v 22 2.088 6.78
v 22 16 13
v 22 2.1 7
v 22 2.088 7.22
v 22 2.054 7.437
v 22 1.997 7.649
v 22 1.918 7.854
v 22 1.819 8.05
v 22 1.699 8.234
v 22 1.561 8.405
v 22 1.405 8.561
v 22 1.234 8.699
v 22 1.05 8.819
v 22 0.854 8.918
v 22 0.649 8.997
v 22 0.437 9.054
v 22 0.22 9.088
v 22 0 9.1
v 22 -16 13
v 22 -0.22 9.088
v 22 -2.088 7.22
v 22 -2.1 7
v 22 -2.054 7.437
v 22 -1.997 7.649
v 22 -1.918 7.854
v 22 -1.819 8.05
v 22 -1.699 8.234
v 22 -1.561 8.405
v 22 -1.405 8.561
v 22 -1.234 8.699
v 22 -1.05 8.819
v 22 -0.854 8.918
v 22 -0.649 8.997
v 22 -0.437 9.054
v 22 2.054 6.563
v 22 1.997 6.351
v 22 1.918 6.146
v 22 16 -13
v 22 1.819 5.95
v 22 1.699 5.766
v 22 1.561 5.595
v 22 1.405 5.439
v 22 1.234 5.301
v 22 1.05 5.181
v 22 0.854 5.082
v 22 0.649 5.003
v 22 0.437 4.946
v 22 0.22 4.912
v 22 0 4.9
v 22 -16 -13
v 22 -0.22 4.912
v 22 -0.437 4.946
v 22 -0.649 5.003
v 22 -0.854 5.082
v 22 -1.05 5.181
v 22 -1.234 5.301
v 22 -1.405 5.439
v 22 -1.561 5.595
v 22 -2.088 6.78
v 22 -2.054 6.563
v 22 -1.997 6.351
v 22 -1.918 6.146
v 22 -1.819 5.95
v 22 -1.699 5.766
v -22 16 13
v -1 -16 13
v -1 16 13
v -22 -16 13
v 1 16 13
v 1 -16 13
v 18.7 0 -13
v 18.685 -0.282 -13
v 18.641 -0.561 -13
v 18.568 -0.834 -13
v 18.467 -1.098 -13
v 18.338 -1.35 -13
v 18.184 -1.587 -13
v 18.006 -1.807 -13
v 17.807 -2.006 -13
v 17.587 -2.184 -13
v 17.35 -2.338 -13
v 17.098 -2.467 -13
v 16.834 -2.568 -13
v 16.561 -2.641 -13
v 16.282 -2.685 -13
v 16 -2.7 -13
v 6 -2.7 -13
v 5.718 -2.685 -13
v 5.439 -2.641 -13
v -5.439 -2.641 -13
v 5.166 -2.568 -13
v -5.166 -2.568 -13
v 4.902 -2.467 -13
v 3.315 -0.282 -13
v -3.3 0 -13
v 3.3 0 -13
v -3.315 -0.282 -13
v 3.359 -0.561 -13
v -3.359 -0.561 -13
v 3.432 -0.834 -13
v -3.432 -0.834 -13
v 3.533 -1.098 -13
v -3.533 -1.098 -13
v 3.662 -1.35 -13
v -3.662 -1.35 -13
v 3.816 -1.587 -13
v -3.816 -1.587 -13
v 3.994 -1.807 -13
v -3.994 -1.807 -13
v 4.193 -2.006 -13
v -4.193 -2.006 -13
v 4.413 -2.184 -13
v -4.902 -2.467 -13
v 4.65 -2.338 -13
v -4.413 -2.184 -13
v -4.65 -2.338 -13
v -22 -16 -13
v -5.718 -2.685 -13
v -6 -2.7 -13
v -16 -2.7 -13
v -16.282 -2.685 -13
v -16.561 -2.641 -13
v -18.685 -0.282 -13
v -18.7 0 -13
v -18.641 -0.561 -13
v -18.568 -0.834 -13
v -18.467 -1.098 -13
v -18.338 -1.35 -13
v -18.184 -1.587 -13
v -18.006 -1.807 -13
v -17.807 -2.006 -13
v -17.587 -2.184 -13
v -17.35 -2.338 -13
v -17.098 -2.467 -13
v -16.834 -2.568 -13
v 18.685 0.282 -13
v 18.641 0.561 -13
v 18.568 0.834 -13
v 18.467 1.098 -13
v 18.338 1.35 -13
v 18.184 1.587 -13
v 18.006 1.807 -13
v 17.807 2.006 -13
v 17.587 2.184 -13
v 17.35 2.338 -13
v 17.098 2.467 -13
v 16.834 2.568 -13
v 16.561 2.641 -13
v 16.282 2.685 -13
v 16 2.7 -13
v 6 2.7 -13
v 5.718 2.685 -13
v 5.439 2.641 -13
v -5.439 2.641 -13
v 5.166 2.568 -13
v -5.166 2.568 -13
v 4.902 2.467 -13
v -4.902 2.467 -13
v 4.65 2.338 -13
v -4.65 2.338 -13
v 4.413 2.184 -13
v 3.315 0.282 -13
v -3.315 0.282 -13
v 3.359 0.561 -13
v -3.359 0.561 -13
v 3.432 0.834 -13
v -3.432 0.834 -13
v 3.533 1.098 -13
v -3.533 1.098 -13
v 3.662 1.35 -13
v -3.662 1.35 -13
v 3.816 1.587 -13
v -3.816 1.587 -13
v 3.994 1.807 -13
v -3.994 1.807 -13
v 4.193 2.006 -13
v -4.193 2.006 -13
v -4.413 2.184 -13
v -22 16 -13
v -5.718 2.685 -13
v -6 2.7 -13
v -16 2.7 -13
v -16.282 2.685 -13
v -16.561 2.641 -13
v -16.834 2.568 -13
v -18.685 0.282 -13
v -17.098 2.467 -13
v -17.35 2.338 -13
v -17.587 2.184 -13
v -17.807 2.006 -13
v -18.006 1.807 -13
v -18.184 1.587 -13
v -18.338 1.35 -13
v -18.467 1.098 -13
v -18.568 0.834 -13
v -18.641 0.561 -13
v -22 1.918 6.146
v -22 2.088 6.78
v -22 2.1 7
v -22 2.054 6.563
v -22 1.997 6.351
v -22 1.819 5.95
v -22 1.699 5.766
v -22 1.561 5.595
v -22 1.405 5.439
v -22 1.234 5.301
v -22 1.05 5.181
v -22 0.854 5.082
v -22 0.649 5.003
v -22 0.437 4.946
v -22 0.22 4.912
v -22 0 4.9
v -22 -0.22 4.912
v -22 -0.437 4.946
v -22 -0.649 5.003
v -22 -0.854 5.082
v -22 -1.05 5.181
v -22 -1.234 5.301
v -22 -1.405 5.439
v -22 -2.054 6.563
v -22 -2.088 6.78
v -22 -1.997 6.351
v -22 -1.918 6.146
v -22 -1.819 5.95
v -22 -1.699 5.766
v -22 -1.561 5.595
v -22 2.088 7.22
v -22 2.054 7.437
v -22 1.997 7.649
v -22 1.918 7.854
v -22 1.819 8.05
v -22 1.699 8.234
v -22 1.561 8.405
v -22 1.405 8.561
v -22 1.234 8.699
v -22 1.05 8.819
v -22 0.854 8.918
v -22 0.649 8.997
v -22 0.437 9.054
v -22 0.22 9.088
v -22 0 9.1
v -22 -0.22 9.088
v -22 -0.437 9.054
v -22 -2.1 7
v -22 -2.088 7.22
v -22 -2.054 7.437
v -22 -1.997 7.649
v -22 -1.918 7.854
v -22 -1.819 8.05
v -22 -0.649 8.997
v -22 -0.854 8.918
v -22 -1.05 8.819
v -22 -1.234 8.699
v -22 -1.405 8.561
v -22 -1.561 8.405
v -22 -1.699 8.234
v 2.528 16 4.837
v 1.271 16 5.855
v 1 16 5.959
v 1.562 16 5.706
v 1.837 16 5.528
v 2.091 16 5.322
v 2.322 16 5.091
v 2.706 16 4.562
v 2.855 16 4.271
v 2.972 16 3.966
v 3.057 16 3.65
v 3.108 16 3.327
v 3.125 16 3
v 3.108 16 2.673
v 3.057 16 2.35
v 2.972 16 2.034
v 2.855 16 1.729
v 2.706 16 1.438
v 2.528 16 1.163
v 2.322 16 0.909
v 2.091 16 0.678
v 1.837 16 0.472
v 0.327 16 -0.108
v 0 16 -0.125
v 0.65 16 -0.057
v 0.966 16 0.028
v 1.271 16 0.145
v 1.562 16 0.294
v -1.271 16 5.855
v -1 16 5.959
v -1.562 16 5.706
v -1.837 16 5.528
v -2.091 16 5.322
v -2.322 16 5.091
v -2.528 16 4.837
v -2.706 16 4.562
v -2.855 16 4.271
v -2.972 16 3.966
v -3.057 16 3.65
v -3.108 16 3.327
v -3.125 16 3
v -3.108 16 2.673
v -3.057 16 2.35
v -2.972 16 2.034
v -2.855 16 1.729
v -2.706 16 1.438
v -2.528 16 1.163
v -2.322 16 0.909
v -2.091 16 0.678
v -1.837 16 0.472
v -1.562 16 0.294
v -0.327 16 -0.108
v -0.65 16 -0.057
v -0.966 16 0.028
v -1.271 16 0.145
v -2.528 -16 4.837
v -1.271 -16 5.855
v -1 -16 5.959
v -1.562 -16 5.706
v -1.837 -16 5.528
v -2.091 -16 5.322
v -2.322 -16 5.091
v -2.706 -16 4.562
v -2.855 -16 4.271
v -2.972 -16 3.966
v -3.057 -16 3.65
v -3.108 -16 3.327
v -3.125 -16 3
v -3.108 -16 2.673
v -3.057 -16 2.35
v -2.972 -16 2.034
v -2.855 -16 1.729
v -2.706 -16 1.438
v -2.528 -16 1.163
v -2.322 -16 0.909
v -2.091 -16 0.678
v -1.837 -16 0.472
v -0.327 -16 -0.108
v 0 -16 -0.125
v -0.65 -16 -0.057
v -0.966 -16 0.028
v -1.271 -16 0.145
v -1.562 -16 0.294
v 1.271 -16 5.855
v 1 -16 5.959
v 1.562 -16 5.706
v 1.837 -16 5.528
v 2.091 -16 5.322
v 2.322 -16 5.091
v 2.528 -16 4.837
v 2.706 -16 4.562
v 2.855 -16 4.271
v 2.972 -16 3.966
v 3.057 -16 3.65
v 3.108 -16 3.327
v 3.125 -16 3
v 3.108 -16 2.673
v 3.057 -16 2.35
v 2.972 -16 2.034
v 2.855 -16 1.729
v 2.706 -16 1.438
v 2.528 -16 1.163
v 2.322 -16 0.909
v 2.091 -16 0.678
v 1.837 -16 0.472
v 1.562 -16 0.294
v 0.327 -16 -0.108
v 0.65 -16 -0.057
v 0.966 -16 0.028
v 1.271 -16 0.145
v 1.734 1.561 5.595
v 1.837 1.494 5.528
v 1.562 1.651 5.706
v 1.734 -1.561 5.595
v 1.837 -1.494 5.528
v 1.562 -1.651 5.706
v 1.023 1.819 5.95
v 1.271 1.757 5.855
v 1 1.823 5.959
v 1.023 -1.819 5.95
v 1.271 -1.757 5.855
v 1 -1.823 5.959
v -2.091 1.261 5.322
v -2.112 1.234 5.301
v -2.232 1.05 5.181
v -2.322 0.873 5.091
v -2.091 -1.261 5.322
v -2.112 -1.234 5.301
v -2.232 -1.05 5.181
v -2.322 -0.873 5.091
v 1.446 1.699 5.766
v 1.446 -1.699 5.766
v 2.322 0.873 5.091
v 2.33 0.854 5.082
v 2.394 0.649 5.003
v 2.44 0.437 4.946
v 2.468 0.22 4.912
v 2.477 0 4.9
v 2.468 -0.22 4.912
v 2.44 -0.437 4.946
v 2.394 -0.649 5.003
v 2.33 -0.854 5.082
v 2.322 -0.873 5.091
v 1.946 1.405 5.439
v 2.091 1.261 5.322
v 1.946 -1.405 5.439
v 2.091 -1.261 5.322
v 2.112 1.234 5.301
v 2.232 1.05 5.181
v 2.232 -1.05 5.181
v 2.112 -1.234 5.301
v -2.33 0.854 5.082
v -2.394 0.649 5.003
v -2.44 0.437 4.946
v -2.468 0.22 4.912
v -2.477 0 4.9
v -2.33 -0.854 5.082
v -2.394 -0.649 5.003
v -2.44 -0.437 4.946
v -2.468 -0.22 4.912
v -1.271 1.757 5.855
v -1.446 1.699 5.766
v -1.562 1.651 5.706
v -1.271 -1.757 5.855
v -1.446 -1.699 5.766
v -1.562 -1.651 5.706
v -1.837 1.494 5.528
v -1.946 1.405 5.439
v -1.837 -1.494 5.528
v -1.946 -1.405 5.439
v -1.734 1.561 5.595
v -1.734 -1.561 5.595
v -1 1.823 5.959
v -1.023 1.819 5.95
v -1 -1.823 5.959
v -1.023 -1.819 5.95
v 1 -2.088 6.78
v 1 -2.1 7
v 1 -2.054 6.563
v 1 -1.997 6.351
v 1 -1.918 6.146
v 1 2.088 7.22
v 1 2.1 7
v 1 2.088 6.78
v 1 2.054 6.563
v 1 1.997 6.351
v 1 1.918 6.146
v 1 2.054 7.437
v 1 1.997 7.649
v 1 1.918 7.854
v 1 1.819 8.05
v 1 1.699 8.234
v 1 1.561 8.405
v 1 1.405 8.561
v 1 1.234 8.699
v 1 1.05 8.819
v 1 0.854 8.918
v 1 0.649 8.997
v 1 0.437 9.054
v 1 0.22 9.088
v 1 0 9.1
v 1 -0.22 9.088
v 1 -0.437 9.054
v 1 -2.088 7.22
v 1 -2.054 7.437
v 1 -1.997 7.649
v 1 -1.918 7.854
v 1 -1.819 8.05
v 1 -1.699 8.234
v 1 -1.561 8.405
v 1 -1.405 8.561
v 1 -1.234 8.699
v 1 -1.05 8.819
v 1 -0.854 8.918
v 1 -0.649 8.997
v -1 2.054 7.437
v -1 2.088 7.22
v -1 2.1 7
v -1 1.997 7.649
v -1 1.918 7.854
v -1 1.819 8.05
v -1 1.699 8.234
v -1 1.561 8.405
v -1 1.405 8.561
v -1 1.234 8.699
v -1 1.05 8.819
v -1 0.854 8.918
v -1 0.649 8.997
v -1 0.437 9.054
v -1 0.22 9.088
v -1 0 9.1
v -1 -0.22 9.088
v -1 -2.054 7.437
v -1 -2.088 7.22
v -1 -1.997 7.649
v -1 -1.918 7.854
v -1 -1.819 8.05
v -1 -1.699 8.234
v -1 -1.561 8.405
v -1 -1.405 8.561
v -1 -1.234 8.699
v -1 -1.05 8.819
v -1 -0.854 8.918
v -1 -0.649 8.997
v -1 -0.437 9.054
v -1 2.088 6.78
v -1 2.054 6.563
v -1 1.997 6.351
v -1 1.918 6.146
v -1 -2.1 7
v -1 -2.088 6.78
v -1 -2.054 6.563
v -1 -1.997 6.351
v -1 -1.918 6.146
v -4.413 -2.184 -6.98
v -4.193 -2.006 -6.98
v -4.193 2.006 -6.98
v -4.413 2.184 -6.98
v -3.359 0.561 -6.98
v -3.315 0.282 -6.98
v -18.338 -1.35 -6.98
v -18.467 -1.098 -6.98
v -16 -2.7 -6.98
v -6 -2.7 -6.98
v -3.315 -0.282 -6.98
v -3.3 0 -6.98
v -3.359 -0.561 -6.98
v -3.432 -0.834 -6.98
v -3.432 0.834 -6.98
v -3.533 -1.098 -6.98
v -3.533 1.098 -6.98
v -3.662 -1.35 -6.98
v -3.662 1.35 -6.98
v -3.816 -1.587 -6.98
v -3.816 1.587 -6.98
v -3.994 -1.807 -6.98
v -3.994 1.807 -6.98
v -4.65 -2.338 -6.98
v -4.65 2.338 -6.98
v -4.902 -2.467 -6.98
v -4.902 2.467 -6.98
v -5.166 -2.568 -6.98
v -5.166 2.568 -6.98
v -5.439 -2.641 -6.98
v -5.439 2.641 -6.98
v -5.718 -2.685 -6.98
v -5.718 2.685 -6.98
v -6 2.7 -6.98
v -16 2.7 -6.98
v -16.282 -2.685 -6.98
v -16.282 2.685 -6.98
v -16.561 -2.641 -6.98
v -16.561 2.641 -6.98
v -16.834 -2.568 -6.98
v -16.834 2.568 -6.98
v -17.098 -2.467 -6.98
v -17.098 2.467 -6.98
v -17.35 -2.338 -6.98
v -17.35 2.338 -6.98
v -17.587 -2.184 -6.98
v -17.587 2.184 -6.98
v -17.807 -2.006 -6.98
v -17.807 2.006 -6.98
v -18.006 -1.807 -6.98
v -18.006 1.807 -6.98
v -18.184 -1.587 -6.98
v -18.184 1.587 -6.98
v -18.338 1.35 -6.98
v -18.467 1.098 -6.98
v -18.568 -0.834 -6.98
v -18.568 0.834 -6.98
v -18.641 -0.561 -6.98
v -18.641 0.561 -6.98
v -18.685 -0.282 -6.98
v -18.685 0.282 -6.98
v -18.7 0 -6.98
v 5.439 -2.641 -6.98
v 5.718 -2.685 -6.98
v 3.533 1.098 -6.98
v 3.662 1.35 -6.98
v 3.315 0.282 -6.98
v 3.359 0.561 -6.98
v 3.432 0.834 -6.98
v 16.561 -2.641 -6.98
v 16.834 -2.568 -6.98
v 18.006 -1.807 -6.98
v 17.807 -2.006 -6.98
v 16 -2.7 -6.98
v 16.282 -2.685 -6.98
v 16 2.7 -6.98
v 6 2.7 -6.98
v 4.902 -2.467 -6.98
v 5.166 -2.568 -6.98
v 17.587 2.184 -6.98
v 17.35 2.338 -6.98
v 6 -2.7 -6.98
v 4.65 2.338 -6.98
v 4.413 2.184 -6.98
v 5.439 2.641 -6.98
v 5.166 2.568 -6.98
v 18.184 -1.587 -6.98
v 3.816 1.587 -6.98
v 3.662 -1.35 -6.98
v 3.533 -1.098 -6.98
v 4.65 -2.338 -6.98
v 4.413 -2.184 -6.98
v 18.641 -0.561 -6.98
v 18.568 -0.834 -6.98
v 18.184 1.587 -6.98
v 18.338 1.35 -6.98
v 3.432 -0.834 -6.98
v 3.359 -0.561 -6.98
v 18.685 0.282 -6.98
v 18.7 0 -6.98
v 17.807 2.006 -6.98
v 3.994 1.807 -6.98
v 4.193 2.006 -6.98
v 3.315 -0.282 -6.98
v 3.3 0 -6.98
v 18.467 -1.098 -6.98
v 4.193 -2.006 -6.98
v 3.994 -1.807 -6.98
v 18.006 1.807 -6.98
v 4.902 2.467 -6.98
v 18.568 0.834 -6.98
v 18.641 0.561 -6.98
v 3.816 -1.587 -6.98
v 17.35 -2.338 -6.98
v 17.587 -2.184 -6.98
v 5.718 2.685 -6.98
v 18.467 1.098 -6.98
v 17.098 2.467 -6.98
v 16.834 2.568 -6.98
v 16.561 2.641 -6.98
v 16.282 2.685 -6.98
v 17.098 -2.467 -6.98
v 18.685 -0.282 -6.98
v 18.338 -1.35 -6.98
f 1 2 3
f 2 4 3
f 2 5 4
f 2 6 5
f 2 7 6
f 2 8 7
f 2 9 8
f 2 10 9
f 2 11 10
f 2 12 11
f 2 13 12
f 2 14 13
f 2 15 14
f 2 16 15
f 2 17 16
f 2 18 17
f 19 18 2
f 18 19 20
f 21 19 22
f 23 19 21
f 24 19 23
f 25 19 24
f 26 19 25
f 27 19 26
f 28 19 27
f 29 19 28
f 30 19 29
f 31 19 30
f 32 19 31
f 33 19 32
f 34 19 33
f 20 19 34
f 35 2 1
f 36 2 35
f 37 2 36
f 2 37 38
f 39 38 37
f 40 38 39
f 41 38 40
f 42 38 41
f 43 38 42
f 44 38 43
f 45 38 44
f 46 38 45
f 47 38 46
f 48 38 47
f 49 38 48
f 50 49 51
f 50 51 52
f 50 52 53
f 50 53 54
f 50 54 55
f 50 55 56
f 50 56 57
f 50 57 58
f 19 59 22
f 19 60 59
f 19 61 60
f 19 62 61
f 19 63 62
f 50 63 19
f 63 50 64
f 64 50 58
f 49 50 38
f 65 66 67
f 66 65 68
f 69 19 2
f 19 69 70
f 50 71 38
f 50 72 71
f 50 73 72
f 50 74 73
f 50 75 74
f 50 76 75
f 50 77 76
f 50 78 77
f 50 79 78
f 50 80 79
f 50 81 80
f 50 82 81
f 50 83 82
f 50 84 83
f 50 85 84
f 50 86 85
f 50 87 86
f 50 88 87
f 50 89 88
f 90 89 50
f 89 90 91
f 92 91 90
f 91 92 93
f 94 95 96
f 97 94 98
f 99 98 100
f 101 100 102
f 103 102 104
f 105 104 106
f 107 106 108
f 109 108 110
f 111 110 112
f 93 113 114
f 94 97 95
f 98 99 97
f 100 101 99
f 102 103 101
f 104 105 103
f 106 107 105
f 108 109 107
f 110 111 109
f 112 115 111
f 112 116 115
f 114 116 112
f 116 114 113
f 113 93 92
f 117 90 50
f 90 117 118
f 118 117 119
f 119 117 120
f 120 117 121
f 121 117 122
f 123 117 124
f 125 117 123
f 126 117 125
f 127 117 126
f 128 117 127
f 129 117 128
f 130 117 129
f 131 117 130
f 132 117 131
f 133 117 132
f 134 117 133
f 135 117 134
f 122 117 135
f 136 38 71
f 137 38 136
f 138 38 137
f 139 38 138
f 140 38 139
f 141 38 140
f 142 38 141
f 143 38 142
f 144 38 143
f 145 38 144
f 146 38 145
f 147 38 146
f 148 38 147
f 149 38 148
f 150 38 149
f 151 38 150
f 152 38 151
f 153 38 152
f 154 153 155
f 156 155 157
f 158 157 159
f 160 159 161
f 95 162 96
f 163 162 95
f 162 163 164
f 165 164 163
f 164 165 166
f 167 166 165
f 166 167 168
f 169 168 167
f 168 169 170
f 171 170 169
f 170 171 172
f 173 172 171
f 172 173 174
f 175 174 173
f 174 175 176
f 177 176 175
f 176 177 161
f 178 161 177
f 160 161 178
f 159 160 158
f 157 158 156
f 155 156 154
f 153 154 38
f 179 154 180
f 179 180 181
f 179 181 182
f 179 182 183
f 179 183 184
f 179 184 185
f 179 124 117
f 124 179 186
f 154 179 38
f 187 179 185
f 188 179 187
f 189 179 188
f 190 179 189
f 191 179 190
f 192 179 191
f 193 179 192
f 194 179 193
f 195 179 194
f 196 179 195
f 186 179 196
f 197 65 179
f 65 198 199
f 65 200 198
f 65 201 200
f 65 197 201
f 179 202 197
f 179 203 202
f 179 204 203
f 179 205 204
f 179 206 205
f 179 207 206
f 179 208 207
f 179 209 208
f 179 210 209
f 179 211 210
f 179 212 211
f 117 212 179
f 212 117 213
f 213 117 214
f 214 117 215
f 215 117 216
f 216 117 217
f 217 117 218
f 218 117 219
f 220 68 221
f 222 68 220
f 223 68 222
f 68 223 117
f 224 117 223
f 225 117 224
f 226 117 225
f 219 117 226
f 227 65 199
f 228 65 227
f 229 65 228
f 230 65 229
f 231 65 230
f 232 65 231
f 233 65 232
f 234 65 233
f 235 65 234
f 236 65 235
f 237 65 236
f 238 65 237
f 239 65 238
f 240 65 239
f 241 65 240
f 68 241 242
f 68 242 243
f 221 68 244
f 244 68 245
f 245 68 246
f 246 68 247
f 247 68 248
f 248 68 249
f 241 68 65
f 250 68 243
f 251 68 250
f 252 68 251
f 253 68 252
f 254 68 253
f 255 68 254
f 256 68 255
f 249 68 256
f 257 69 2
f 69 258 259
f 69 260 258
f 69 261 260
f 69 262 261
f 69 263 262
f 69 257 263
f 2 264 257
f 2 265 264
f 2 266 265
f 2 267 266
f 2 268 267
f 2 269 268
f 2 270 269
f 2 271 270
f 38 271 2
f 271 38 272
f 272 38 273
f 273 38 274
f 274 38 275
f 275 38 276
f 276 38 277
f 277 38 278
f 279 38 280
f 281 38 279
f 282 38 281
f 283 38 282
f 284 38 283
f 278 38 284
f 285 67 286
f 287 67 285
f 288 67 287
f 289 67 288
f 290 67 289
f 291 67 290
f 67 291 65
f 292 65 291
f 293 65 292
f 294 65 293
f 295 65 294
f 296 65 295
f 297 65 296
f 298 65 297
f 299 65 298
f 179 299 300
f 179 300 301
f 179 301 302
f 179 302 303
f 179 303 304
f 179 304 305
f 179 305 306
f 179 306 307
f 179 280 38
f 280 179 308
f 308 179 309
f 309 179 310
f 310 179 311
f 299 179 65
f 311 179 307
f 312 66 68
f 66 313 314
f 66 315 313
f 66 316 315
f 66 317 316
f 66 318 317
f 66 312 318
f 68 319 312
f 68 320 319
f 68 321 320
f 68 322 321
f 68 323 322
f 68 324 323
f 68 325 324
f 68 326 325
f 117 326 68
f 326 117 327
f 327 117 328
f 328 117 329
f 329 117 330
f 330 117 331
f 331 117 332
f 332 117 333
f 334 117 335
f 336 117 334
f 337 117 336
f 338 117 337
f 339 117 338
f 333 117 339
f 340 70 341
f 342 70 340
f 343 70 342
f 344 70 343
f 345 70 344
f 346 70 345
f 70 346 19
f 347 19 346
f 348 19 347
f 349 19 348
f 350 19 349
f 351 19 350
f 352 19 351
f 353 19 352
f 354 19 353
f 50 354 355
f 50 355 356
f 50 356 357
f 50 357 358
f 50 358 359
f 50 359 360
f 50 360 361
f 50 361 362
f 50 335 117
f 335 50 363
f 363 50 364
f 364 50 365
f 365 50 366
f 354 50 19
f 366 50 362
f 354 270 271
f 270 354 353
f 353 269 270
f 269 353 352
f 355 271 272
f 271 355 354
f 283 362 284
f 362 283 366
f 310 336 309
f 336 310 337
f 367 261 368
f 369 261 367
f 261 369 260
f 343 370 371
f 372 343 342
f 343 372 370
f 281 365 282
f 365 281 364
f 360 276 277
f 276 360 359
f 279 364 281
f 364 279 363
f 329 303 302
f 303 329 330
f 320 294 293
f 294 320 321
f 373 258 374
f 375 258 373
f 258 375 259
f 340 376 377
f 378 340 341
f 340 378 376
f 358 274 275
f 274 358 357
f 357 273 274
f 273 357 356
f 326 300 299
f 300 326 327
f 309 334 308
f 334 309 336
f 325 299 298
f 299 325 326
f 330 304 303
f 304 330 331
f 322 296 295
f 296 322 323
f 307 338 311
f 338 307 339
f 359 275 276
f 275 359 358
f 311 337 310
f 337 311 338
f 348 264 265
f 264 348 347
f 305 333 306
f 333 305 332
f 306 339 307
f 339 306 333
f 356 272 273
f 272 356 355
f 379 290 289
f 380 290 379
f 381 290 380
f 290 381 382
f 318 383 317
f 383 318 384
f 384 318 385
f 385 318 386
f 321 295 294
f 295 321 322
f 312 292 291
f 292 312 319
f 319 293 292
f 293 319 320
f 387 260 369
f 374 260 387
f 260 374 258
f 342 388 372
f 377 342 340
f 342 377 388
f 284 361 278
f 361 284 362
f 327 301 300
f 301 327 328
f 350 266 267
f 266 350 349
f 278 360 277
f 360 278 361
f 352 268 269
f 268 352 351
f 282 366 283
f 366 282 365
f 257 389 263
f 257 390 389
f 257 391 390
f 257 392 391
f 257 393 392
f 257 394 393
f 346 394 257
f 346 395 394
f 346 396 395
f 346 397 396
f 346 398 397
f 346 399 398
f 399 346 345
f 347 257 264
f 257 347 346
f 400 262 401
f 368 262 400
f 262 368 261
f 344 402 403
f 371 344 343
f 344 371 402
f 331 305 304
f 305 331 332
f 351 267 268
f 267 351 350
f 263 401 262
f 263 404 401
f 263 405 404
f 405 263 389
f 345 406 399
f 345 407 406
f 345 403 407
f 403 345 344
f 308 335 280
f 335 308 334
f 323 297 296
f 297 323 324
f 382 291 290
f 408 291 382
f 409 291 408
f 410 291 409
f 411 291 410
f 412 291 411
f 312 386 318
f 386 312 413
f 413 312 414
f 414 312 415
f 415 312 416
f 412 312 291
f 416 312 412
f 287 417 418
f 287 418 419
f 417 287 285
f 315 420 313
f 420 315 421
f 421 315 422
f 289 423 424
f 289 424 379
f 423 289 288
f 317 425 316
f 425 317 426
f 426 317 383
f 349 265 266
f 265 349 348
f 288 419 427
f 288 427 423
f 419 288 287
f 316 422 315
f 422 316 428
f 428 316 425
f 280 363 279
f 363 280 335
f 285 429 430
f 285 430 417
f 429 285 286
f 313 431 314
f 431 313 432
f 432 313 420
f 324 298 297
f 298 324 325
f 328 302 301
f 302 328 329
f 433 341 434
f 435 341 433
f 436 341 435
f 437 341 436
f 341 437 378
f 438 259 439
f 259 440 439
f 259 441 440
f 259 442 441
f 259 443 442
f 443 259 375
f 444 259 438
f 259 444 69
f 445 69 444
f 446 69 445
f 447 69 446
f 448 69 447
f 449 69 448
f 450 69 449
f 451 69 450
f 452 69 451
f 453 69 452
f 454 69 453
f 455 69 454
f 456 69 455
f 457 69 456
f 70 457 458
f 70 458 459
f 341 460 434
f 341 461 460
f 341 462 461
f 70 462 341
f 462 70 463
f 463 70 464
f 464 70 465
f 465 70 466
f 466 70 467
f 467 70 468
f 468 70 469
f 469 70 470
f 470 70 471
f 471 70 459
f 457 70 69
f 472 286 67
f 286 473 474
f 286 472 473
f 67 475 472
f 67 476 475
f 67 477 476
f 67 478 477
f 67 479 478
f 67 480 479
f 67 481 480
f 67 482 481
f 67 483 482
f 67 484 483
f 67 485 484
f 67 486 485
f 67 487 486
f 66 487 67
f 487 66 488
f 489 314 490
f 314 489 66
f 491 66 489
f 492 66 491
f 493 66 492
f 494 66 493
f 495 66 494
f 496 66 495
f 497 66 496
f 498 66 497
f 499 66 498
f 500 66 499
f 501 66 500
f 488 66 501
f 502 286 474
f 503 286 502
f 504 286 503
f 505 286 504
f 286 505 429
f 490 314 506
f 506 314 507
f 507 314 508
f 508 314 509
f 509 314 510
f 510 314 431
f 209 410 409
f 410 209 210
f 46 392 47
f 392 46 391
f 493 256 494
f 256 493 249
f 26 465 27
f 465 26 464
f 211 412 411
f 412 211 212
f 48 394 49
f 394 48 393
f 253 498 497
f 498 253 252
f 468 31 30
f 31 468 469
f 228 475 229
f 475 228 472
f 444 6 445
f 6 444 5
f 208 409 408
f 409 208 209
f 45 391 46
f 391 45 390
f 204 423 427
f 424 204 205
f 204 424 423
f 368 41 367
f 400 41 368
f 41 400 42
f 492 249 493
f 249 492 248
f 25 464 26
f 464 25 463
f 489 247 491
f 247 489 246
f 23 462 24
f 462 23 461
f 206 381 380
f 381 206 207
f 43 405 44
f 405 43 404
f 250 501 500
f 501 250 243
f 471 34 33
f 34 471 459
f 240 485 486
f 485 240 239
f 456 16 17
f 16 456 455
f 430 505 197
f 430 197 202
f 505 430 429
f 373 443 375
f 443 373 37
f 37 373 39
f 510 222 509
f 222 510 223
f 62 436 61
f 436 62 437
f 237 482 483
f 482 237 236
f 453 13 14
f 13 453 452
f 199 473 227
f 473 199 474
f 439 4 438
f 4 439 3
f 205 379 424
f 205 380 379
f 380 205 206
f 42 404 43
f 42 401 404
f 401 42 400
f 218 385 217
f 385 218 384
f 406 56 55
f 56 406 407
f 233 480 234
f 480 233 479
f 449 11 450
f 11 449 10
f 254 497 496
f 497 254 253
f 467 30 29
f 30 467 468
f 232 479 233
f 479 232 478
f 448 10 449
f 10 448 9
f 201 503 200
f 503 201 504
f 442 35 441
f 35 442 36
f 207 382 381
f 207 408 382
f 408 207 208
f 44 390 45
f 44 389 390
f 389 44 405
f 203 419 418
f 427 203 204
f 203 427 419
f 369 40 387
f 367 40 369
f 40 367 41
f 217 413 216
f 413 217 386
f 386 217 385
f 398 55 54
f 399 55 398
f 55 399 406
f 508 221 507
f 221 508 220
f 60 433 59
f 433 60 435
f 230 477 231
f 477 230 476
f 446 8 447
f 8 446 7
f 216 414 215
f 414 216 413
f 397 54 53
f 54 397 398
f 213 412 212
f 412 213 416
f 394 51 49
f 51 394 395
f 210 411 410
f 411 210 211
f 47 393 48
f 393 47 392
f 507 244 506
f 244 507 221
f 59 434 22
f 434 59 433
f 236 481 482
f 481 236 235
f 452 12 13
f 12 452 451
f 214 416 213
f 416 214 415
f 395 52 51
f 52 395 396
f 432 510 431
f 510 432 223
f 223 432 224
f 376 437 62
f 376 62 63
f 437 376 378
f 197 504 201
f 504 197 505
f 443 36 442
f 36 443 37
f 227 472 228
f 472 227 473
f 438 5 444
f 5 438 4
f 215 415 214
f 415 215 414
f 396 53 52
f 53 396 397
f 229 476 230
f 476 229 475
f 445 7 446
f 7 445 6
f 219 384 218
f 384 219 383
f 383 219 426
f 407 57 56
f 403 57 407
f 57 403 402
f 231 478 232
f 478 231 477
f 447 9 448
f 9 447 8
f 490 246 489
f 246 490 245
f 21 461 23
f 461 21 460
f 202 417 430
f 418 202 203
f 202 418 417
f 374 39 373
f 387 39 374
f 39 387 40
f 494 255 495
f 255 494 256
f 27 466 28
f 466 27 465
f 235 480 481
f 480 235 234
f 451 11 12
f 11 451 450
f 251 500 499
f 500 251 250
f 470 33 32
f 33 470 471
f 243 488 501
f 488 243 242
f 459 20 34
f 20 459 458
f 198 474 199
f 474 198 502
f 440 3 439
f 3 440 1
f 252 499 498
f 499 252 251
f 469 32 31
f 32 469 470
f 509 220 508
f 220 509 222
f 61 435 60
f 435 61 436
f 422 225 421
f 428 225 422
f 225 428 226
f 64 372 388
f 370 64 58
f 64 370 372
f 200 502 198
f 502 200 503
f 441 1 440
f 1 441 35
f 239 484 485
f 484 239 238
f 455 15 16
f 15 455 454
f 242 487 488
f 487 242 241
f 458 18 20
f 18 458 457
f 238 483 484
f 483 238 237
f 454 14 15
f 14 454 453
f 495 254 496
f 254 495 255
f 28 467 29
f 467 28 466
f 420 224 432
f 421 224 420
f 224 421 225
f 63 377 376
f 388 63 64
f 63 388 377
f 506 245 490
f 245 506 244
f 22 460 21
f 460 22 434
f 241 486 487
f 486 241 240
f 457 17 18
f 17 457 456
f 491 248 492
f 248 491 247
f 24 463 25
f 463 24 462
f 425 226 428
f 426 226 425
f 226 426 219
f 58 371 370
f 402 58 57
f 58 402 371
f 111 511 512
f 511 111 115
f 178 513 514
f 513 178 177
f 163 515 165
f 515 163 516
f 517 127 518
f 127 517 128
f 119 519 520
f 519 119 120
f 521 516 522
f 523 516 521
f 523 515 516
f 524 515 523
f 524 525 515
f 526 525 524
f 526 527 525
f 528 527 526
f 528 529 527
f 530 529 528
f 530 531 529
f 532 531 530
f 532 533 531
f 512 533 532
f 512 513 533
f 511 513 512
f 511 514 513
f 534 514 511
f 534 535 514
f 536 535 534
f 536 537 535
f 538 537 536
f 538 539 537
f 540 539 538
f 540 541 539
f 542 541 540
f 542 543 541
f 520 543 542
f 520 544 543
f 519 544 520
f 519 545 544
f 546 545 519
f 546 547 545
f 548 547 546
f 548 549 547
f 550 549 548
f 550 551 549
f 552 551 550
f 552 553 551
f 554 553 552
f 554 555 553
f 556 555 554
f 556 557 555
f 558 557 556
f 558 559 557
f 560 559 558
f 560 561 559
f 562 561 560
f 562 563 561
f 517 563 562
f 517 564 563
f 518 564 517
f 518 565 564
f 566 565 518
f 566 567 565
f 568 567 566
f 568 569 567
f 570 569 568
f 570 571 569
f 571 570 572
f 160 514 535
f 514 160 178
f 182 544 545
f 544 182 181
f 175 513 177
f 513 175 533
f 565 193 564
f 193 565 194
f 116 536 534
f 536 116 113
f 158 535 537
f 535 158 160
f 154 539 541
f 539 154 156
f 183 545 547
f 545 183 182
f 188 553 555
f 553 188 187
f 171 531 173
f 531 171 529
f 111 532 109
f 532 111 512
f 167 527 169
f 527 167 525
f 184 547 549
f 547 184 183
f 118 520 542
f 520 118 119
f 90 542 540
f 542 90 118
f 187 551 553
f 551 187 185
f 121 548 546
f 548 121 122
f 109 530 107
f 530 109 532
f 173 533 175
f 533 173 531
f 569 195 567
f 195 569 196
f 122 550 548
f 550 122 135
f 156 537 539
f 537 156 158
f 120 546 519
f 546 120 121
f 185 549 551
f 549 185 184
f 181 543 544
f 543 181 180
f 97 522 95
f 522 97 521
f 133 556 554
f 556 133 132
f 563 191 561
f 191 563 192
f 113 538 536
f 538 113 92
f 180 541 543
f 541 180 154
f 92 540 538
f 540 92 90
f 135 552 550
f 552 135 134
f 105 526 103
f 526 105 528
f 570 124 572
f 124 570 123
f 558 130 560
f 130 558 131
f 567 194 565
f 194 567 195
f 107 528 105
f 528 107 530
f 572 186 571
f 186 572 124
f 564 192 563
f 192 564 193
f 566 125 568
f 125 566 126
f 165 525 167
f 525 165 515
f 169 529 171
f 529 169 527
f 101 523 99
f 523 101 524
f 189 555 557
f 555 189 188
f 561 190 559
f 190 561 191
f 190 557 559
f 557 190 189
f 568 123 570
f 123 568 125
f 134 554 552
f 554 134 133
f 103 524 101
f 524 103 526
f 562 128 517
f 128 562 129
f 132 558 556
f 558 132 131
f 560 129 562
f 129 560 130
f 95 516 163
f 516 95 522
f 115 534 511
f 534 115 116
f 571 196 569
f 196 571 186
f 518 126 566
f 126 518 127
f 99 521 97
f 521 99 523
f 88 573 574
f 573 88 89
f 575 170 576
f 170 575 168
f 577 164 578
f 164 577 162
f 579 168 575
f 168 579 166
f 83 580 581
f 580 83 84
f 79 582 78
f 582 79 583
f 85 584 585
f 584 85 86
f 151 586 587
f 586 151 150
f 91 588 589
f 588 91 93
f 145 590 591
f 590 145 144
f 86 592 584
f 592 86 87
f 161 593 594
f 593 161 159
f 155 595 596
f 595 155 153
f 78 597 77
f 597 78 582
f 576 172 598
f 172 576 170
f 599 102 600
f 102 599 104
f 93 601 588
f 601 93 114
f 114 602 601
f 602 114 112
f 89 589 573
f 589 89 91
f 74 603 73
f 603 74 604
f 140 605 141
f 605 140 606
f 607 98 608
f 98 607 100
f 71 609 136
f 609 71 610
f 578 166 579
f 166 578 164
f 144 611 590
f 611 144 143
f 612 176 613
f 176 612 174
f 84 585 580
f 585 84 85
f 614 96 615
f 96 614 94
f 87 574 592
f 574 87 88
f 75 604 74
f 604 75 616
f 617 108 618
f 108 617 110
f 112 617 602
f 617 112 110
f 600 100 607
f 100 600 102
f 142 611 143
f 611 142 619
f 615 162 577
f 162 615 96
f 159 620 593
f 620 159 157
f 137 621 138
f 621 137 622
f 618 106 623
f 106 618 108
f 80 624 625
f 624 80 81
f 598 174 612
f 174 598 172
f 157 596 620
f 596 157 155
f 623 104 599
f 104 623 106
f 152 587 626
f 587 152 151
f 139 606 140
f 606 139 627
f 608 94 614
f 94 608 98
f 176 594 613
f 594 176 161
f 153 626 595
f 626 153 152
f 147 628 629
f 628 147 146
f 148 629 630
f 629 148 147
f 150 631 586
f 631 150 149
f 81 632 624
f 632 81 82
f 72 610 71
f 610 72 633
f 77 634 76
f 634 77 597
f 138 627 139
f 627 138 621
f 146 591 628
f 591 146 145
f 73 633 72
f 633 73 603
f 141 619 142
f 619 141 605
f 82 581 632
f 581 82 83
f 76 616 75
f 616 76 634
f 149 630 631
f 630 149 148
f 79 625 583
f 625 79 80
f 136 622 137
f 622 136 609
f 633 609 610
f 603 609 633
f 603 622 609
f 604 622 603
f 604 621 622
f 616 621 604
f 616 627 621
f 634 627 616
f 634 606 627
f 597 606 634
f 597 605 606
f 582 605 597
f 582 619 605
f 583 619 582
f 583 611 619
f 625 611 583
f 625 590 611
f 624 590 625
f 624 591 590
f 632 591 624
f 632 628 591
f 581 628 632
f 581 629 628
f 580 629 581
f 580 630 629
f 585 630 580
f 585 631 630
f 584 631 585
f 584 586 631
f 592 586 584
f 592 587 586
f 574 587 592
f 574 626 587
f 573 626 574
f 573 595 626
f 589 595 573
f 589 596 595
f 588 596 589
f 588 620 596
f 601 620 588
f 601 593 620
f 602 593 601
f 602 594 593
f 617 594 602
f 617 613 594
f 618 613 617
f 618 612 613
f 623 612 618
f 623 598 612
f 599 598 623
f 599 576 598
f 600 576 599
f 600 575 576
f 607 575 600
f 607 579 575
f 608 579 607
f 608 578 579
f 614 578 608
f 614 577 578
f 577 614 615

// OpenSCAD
// Clamp pedestal for 6 mm shaft.
$fn = 60;
eps = 0.02;
shaft_d = 6;
body_l = 44;
body_d = 32;
body_h = 26;
base_t = 6;
slot_w = 2;
mount_d = 5.4;
module mount_slot(x) {
    hull() {
        translate([x - 5, 0, -body_h / 2 - eps]) cylinder(d = mount_d, h = base_t + 2 * eps);
        translate([x + 5, 0, -body_h / 2 - eps]) cylinder(d = mount_d, h = base_t + 2 * eps);
    }
}
difference() {
    cube([body_l, body_d, body_h], center = true);
    translate([0, -body_d / 2 - eps, 3]) rotate([-90, 0, 0]) cylinder(d = shaft_d + 0.25, h = body_d + 2 * eps);
    translate([-slot_w / 2, -body_d / 2 - eps, 3]) cube([slot_w, body_d + 2 * eps, body_h / 2 + eps]);
    translate([-body_l / 2 - eps, 0, body_h / 2 - 6]) rotate([0, 90, 0]) cylinder(d = 4.2, h = body_l + 2 * eps);
    mount_slot(-body_l / 4);
    mount_slot(body_l / 4);
}
